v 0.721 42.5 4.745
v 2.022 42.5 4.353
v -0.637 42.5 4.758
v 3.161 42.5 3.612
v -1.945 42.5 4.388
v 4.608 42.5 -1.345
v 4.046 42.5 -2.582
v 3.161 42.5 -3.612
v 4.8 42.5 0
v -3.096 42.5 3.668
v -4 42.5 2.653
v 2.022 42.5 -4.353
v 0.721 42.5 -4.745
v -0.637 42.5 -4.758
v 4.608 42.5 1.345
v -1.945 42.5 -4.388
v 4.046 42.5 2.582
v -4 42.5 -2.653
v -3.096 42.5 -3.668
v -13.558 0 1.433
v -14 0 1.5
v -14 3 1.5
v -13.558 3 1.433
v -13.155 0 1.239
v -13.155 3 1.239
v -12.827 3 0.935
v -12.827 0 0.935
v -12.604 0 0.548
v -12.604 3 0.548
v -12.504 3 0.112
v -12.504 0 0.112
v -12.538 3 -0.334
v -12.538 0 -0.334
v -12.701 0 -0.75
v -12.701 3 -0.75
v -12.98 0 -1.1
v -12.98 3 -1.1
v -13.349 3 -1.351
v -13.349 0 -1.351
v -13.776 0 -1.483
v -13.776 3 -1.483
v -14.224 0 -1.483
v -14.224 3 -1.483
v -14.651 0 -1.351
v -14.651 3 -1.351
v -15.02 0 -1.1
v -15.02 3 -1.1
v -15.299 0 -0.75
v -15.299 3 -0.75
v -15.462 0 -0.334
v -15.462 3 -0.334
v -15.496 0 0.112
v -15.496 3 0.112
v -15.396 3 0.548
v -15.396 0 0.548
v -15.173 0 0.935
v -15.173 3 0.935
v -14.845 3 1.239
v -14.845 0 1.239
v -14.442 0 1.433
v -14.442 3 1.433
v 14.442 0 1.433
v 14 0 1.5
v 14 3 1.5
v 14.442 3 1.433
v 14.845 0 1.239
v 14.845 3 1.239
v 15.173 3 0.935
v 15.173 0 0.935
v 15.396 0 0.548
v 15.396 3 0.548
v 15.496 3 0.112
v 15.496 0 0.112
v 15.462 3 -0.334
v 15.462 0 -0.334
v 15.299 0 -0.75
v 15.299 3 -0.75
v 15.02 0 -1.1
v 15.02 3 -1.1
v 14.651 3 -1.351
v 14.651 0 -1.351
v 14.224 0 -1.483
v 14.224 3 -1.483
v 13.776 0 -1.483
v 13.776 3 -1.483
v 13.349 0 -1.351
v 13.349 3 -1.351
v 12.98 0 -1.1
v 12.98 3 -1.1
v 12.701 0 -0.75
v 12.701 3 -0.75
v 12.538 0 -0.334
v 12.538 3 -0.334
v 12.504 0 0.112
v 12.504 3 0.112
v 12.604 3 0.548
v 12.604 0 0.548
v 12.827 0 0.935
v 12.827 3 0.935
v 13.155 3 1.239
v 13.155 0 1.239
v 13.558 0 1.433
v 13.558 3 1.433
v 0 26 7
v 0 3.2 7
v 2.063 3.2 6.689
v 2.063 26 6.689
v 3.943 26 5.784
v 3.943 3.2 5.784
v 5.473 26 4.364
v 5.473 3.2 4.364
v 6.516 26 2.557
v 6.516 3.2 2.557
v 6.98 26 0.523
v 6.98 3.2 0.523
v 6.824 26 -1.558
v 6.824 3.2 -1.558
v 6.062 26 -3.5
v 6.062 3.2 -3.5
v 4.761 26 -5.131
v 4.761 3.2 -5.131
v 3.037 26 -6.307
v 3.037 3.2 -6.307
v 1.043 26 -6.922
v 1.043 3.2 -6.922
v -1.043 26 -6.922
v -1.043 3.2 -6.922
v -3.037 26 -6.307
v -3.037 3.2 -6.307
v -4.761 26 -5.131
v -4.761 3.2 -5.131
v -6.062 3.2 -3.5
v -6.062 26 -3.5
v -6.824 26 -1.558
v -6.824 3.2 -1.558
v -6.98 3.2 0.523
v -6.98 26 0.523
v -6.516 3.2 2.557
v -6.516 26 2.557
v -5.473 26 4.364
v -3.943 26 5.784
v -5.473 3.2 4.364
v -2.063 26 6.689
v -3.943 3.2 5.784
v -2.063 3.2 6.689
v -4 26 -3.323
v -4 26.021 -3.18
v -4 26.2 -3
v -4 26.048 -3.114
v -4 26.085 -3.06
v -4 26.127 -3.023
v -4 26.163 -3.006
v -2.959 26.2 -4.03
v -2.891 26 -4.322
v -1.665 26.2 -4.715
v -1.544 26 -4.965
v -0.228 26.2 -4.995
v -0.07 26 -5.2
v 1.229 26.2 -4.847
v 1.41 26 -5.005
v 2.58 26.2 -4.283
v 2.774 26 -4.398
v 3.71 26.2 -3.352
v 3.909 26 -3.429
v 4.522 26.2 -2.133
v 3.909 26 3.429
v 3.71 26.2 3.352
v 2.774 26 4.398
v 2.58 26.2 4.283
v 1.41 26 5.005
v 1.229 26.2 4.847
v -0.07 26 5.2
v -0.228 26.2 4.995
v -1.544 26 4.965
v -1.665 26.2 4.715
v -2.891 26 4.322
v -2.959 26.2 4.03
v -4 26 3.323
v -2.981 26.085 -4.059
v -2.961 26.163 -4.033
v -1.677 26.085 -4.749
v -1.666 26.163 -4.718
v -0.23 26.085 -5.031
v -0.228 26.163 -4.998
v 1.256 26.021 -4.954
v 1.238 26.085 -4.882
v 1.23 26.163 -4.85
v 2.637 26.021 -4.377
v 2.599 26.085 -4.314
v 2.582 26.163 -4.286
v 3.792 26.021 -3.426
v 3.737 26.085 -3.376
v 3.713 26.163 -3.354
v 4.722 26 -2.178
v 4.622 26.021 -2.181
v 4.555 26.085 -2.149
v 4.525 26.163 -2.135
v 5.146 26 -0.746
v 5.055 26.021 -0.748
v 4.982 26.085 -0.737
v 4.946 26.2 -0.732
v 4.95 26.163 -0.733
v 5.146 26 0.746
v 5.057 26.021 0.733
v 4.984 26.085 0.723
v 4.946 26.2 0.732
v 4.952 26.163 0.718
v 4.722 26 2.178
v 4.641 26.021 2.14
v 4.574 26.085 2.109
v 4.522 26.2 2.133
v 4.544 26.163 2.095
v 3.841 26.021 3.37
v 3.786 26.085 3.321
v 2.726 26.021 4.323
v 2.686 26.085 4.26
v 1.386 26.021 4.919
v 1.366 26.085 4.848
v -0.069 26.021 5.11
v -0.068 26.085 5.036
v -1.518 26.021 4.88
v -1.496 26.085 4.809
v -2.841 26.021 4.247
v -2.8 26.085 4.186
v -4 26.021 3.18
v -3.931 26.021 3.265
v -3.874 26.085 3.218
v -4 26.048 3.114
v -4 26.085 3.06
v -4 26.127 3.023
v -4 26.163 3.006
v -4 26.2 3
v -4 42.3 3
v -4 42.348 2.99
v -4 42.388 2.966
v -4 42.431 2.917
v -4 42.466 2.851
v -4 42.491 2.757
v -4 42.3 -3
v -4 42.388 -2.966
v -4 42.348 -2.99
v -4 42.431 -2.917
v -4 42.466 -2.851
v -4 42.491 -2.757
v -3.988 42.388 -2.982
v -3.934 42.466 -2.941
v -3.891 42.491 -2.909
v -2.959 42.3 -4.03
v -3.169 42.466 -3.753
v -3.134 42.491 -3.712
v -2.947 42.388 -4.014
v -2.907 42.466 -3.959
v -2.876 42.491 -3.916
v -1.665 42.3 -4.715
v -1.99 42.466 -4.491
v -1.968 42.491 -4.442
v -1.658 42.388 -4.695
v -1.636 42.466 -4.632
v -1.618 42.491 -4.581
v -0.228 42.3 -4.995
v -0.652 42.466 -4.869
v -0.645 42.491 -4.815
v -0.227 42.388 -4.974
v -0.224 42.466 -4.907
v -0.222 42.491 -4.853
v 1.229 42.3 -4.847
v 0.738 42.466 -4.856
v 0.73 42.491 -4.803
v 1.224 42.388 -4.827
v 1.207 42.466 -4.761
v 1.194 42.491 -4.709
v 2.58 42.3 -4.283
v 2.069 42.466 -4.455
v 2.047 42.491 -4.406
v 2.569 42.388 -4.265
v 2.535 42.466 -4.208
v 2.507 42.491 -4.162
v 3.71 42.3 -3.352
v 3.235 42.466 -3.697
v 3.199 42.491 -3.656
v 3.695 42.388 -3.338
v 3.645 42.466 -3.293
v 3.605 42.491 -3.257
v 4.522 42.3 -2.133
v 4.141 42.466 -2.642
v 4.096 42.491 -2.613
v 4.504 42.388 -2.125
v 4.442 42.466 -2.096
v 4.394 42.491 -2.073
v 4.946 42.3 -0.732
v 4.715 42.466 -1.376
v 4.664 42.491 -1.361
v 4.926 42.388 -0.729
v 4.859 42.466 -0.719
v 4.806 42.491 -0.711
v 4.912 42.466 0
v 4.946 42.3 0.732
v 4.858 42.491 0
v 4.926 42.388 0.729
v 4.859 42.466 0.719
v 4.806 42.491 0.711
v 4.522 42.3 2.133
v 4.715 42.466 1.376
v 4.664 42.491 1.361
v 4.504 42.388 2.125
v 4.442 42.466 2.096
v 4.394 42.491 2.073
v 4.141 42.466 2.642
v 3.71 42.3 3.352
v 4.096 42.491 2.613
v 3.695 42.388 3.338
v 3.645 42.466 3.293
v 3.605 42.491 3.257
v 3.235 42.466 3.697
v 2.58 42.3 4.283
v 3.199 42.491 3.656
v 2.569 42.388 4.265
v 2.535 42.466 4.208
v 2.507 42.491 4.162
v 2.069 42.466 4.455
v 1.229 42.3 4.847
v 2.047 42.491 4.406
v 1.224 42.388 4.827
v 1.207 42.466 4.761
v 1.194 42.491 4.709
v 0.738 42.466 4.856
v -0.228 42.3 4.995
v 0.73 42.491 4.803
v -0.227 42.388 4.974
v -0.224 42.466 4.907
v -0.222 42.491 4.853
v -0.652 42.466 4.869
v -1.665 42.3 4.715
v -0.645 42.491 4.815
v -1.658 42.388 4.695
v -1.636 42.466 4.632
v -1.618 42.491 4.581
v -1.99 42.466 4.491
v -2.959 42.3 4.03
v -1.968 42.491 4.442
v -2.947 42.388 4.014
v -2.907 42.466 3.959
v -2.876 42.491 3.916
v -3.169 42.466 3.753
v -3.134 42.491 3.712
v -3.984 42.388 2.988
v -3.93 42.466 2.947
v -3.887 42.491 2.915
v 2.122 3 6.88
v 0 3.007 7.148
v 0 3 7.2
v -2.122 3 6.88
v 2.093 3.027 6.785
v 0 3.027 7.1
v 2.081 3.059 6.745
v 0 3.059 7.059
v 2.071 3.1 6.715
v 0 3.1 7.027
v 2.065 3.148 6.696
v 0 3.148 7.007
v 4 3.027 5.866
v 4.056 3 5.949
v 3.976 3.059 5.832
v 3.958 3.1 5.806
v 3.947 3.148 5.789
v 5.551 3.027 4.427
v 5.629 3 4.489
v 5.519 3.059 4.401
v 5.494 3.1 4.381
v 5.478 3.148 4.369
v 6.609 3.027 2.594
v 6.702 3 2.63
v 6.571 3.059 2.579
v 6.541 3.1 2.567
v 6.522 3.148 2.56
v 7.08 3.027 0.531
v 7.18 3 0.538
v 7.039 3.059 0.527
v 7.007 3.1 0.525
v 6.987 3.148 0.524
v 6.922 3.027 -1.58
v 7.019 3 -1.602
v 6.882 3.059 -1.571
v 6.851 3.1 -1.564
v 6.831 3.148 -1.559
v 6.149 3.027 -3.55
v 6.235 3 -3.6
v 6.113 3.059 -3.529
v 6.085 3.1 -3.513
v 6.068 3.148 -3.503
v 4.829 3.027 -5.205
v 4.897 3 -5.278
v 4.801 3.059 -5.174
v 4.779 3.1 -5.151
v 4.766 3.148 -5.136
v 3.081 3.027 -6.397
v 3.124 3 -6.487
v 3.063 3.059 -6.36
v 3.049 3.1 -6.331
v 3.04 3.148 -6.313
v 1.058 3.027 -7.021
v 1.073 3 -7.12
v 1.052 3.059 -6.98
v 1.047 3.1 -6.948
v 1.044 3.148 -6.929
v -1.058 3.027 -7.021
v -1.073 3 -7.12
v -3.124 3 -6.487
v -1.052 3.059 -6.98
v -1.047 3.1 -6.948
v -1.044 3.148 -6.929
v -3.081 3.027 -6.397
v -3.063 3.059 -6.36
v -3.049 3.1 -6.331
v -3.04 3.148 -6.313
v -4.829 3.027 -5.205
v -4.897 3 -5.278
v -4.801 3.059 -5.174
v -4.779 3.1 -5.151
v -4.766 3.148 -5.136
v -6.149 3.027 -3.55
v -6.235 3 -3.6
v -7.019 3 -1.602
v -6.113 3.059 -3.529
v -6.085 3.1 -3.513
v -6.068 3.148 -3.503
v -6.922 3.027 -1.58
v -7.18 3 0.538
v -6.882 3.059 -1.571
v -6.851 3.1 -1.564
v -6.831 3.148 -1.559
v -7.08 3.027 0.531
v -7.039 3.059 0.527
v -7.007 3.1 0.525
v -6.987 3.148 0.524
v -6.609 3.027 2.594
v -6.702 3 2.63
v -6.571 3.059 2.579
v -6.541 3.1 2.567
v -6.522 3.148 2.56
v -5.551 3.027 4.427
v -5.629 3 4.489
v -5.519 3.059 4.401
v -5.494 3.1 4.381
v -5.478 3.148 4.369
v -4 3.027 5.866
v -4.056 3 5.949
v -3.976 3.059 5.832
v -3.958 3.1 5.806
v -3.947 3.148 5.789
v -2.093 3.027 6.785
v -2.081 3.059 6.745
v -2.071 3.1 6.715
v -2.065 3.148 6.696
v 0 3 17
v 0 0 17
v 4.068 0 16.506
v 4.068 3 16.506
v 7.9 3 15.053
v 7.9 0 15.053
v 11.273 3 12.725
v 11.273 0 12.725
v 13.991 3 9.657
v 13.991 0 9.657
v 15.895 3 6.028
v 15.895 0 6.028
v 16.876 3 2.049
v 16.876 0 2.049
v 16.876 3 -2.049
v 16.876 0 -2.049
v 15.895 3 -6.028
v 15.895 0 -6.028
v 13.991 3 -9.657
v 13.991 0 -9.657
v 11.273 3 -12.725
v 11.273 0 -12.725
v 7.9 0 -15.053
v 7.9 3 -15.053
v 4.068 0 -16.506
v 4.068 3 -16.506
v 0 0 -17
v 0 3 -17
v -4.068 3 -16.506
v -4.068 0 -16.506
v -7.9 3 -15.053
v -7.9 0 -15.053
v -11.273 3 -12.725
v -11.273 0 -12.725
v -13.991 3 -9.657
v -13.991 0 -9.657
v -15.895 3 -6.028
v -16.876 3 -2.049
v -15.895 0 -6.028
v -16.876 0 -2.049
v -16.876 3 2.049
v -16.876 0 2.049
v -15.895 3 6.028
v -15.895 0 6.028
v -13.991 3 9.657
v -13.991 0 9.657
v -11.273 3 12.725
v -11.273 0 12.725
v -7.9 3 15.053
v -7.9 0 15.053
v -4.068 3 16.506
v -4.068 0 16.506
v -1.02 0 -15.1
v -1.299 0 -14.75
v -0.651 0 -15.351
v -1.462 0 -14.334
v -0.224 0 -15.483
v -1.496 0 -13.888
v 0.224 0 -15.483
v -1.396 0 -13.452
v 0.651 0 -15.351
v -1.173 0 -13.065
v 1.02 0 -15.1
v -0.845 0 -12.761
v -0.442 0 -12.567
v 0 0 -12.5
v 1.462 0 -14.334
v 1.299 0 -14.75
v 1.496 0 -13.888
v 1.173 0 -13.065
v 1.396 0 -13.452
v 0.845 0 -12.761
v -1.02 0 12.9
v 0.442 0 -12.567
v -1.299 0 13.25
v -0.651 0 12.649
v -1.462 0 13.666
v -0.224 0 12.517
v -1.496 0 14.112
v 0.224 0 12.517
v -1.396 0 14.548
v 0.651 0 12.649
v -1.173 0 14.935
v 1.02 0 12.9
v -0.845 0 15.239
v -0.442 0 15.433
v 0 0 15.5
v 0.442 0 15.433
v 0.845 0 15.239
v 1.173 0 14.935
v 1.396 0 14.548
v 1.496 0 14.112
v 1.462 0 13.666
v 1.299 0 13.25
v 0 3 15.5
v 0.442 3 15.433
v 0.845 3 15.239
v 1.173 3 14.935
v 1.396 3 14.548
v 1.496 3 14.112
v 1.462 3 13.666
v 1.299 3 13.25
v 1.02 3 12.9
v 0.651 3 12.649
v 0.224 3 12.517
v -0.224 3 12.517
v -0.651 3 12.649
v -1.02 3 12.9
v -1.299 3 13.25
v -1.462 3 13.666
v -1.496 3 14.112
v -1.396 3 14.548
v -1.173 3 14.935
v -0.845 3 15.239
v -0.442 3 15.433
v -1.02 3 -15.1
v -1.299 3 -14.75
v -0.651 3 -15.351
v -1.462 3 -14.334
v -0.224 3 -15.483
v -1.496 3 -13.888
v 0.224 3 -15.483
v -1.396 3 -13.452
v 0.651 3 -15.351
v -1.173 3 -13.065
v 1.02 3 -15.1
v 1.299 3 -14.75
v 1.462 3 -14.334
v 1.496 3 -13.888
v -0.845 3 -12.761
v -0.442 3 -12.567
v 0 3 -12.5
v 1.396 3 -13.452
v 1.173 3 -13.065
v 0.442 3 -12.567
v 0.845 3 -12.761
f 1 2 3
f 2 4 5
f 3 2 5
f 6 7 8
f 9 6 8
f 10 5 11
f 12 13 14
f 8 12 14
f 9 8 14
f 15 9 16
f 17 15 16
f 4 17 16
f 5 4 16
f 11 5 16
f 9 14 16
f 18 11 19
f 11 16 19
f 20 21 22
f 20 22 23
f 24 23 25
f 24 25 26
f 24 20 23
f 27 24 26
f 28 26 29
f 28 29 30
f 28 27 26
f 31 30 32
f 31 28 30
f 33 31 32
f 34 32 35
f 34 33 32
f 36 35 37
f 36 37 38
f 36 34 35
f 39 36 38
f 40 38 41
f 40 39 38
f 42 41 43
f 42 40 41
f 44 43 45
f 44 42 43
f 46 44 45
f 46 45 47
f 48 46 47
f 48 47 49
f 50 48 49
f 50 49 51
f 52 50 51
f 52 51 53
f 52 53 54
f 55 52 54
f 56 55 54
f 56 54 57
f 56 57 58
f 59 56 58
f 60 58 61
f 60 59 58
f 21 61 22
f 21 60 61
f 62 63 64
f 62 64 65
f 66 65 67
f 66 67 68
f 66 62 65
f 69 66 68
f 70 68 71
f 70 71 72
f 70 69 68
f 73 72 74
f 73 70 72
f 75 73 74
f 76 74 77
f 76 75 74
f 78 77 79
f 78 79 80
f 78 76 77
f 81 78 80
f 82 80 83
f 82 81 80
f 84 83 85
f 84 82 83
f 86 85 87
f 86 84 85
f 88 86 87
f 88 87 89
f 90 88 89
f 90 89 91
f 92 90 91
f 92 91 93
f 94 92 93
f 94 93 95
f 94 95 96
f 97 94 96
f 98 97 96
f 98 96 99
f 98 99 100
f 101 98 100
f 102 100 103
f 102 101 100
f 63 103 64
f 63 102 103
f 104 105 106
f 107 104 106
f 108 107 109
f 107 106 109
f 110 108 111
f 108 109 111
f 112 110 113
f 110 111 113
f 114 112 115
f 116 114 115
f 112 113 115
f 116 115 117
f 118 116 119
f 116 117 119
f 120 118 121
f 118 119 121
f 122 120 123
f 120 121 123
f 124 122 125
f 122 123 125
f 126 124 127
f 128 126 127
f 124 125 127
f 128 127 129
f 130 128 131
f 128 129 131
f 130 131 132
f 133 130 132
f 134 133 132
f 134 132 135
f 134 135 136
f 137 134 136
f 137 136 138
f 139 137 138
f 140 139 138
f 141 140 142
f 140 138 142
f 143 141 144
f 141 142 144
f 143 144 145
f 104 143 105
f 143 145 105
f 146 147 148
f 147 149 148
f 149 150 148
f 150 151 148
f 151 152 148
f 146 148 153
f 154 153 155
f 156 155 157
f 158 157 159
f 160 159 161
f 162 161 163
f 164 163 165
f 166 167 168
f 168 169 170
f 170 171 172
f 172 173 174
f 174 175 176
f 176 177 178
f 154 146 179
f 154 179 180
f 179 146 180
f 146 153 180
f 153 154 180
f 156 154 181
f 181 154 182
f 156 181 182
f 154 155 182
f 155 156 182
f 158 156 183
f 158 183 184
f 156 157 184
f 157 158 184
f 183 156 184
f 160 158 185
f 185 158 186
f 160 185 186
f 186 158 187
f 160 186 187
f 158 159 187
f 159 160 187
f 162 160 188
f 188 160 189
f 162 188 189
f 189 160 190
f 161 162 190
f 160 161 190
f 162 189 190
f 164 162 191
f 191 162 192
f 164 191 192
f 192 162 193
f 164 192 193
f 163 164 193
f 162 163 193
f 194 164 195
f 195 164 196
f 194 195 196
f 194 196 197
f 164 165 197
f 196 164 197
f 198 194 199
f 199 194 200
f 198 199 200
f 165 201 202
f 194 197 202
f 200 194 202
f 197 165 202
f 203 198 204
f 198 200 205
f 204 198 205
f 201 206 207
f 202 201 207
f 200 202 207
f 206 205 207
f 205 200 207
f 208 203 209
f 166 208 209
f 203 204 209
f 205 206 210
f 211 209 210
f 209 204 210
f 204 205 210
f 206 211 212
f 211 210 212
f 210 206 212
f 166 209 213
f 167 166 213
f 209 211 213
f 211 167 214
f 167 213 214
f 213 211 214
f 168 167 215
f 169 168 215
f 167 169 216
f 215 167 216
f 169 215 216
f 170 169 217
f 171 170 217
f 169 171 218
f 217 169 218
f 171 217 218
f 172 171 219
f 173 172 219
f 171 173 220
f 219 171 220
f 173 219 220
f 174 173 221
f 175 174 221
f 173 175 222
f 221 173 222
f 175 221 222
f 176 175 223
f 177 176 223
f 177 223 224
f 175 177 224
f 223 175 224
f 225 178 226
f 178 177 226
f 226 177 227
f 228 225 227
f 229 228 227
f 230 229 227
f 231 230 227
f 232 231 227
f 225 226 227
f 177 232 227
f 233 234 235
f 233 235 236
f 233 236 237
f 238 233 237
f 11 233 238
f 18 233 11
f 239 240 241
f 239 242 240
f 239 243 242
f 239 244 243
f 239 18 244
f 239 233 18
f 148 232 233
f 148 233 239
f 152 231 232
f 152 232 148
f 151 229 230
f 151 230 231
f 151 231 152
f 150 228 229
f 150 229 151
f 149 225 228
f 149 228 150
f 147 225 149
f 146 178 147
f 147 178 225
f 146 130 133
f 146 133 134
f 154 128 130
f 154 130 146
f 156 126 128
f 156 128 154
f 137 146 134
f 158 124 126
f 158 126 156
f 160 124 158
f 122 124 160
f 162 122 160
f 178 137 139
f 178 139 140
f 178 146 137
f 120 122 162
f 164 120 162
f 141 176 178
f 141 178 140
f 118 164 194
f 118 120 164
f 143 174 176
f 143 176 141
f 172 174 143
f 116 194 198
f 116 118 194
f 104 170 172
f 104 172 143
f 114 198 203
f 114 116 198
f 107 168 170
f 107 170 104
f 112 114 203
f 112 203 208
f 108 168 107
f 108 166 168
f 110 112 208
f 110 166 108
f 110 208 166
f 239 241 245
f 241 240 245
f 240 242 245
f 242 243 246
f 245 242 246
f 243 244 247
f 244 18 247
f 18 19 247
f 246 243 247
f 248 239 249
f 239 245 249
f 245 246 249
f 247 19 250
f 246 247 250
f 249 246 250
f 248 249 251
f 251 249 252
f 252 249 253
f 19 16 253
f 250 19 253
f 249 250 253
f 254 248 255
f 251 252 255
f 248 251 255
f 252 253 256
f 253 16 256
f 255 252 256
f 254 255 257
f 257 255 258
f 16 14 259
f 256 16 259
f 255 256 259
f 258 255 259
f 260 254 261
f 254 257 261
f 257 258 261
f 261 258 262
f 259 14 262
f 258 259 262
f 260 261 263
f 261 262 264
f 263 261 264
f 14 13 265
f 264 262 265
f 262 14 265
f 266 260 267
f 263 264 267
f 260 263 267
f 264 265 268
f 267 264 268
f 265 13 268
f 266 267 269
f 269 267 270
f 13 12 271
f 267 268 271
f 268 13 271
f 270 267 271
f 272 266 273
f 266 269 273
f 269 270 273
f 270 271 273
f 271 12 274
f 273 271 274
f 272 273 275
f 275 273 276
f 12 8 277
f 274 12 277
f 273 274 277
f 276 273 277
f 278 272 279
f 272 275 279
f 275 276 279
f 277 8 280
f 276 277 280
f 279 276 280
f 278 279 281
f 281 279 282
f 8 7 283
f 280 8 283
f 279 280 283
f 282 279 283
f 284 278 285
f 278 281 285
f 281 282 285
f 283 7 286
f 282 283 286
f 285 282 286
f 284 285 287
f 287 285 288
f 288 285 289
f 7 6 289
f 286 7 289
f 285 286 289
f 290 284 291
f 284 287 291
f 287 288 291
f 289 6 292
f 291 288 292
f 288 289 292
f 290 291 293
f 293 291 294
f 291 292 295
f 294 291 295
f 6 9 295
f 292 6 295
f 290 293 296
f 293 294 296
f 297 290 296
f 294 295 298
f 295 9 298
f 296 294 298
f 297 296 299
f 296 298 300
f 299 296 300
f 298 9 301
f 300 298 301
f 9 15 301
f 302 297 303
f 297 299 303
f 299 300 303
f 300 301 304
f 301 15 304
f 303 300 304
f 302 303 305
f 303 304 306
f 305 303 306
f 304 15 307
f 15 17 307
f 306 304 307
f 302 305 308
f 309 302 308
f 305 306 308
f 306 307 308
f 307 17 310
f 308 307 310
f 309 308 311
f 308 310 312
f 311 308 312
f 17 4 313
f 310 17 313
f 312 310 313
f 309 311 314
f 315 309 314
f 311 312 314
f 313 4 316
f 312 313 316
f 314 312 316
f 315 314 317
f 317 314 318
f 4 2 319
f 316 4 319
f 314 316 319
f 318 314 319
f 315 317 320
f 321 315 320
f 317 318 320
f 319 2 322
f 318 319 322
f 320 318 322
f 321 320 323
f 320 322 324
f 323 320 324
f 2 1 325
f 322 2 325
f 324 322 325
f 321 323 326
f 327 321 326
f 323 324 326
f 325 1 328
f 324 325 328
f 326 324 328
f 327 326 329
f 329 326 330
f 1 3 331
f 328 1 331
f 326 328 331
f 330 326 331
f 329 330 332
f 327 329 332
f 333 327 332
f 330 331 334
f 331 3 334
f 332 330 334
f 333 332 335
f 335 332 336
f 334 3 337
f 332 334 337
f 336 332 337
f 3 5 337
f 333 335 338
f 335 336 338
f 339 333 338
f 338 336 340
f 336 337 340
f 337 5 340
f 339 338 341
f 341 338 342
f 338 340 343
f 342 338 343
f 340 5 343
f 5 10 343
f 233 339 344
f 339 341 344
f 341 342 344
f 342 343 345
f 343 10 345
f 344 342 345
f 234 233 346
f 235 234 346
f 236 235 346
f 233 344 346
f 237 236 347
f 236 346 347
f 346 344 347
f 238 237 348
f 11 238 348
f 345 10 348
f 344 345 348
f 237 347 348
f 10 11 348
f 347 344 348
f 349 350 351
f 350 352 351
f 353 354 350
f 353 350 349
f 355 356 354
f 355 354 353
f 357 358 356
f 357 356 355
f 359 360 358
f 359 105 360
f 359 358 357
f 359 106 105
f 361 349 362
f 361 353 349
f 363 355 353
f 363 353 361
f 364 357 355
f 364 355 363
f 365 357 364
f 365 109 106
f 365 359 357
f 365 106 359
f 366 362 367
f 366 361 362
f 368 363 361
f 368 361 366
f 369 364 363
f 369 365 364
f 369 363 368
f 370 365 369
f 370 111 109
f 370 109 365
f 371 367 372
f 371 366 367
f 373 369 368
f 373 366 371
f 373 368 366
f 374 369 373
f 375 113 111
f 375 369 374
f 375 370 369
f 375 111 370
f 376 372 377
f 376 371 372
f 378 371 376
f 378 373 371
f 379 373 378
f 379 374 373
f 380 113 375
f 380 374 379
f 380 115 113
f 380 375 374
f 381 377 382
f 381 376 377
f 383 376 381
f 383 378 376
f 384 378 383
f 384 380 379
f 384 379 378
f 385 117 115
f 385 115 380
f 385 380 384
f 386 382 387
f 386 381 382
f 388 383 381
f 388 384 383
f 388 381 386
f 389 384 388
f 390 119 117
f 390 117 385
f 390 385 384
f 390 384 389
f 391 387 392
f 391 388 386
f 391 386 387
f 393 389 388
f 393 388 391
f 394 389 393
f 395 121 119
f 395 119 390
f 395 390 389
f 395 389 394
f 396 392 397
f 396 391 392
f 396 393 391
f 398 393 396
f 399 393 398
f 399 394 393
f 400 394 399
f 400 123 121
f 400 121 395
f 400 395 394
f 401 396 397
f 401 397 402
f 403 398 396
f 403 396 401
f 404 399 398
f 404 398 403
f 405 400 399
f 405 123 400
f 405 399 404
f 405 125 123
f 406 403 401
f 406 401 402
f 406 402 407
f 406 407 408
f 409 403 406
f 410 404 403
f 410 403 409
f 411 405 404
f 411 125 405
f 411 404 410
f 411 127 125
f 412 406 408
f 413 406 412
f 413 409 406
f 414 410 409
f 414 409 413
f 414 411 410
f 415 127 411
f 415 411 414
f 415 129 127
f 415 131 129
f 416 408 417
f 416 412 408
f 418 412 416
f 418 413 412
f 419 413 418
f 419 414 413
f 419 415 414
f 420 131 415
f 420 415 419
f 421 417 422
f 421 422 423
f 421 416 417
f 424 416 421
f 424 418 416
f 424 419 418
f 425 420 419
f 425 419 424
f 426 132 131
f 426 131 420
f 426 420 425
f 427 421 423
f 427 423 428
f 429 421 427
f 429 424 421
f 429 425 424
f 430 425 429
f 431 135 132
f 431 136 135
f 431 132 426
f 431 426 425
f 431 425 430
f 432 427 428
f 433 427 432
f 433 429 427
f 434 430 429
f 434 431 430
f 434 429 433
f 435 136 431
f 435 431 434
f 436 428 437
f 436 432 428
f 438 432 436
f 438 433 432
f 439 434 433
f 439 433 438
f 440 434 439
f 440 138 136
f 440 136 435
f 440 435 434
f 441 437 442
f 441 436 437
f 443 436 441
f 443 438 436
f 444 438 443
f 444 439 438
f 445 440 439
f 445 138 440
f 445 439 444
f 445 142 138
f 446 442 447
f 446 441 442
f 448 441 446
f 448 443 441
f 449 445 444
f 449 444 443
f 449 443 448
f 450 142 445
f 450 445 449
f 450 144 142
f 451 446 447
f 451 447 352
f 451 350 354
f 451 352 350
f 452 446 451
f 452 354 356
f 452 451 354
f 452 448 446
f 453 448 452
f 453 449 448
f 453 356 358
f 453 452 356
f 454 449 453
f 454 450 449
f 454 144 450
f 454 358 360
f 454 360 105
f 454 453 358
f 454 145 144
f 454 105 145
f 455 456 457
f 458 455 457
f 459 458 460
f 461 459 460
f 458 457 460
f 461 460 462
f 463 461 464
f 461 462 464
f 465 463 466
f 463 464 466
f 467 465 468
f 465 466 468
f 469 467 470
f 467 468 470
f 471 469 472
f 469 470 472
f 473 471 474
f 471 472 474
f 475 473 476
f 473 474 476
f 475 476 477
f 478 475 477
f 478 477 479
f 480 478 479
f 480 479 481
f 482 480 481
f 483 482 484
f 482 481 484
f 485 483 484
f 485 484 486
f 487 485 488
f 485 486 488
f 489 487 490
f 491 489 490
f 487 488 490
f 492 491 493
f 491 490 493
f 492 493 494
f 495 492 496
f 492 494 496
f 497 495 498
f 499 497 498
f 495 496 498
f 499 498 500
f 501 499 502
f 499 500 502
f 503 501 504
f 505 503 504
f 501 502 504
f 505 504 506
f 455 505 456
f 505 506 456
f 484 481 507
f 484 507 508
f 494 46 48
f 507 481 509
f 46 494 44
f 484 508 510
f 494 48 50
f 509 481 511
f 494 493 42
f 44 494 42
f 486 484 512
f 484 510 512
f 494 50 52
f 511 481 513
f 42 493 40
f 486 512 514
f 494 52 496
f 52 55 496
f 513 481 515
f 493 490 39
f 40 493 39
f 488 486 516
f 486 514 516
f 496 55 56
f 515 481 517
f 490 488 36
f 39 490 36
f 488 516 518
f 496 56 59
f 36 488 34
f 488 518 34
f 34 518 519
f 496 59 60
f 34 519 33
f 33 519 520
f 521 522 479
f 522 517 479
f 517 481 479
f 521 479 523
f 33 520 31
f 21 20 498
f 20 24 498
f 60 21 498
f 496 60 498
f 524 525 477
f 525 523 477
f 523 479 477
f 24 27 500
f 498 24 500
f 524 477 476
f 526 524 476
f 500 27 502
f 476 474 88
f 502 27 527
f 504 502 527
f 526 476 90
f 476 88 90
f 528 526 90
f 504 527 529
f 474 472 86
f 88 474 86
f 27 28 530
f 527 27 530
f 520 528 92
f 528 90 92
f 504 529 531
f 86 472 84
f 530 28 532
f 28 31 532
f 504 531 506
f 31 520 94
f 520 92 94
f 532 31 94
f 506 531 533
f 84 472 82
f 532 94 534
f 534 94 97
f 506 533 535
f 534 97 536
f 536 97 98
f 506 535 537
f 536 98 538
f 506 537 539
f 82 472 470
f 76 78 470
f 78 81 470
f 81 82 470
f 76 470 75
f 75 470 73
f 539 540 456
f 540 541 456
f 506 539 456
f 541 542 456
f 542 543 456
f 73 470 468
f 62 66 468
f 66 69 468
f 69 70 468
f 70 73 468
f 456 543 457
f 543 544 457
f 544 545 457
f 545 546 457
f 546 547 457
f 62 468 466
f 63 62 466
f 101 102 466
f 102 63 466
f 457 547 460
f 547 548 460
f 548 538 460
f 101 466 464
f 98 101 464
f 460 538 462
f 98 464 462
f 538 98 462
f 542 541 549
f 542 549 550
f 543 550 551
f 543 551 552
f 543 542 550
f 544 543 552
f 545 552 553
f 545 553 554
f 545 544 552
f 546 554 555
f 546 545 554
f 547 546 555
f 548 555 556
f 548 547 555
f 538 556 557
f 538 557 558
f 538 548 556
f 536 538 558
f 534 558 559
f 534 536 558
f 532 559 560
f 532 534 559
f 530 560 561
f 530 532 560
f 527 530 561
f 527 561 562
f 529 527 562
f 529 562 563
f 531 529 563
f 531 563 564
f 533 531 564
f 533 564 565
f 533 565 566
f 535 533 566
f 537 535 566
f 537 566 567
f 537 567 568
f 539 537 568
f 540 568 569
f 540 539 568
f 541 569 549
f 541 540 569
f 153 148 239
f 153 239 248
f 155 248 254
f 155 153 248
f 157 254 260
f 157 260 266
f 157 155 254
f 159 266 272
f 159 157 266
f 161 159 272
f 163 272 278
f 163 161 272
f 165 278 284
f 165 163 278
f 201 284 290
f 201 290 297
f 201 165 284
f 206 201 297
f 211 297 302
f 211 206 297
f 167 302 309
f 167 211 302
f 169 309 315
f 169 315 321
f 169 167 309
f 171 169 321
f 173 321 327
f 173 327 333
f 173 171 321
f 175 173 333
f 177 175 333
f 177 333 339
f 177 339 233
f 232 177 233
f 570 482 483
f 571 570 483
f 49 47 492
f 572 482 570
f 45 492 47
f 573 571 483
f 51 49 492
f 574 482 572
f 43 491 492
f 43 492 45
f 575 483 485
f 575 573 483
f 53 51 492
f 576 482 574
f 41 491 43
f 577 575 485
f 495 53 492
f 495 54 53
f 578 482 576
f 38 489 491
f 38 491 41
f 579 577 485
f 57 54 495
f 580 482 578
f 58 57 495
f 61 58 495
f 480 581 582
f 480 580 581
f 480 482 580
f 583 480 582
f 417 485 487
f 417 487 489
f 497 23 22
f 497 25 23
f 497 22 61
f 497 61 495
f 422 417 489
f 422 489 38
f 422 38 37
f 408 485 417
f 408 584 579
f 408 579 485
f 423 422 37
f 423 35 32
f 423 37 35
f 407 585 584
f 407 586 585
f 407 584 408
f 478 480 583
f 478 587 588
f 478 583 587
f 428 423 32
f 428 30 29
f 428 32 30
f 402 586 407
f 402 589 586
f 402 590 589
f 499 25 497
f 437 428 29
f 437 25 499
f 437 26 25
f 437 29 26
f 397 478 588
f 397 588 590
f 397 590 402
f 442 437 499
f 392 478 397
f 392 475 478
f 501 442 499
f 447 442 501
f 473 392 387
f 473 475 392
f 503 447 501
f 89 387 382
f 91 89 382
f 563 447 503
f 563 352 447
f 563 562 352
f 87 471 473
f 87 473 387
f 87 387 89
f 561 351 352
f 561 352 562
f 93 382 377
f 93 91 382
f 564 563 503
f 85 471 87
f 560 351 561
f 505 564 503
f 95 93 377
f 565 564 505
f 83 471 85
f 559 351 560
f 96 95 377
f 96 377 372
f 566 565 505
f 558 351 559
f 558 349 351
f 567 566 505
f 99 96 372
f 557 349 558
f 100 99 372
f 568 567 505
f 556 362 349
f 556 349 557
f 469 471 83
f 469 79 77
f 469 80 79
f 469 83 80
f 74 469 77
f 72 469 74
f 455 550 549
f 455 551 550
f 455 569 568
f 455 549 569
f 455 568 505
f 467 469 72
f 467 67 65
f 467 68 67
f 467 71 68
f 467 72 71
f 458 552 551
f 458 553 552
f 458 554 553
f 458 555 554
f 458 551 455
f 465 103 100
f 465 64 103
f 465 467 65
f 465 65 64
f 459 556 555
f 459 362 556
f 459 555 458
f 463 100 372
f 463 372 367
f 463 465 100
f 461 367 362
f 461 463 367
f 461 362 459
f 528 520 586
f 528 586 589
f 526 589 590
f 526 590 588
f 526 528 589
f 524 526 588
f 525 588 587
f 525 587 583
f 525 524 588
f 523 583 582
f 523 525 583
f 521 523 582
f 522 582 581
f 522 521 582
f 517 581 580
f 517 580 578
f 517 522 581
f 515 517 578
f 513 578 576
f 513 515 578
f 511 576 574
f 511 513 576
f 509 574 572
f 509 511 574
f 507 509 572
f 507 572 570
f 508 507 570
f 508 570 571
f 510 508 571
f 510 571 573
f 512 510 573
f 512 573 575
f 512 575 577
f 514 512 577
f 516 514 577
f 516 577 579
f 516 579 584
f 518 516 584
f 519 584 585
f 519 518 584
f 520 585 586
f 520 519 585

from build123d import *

# Parameters (mm, degrees)
SKETCH_1_R      = 17
SKETCH_1_R_2    = 1.5
EXTRUDE_1_DEPTH = 3
SKETCH_2_R      = 7
EXTRUDE_2_DEPTH = 23
EXTRUDE_3_DEPTH = 16.5
FILLET_1_R      = 0.2


with BuildPart() as part:
    # 草图1 → 凸台-拉伸1 (new body)
    with BuildSketch(Plane(origin=(0, 0, 0), x_dir=(1, 0, 0), z_dir=(0, 1, 0))):
        with Locations(Location((0, 0, 0), (0, 0, 270))):
            Circle(SKETCH_1_R)
        with Locations(Location((0, 14, 0), (0, 0, 270))):
            Circle(SKETCH_1_R_2, mode=Mode.SUBTRACT)
        with Locations(Location((14, 0, 0), (0, 0, 270))):
            Circle(SKETCH_1_R_2, mode=Mode.SUBTRACT)
        with Locations(Location((0, -14, 0), (0, 0, 270))):
            Circle(SKETCH_1_R_2, mode=Mode.SUBTRACT)
        with Locations(Location((-14, 0, 0), (0, 0, 270))):
            Circle(SKETCH_1_R_2, mode=Mode.SUBTRACT)
    extrude(amount=EXTRUDE_1_DEPTH)

    # 草图2 → 凸台-拉伸2 (add)
    with BuildSketch(Plane(origin=(0, 3, 0), x_dir=(1, 0, 0), z_dir=(0, 1, 0))):
        with Locations(Location((0, 0, 0), (0, 0, 270))):
            Circle(SKETCH_2_R)
    extrude(amount=EXTRUDE_2_DEPTH)

    # 草图3 → 凸台-拉伸3 (add)
    with BuildSketch(Plane(origin=(0, 26, 0), x_dir=(1, 0, 0), z_dir=(0, 1, 0))):
        with BuildLine():
            Line((-4, 0), (-4, 3))
            ThreePointArc((-4, 3), (5, 0), (-4, -3))
            Line((-4, -3), (-4, 0))
        make_face()
    extrude(amount=EXTRUDE_3_DEPTH)

    # 圆角1
    fillet_1_edges = [part.edges().sort_by_distance(p)[0] for p in [
        (0, 3, -7),
        (5, 26, 0),
        (5, 42.5, 0),
    ]]
    fillet(fillet_1_edges, radius=FILLET_1_R)


solid = part.part
